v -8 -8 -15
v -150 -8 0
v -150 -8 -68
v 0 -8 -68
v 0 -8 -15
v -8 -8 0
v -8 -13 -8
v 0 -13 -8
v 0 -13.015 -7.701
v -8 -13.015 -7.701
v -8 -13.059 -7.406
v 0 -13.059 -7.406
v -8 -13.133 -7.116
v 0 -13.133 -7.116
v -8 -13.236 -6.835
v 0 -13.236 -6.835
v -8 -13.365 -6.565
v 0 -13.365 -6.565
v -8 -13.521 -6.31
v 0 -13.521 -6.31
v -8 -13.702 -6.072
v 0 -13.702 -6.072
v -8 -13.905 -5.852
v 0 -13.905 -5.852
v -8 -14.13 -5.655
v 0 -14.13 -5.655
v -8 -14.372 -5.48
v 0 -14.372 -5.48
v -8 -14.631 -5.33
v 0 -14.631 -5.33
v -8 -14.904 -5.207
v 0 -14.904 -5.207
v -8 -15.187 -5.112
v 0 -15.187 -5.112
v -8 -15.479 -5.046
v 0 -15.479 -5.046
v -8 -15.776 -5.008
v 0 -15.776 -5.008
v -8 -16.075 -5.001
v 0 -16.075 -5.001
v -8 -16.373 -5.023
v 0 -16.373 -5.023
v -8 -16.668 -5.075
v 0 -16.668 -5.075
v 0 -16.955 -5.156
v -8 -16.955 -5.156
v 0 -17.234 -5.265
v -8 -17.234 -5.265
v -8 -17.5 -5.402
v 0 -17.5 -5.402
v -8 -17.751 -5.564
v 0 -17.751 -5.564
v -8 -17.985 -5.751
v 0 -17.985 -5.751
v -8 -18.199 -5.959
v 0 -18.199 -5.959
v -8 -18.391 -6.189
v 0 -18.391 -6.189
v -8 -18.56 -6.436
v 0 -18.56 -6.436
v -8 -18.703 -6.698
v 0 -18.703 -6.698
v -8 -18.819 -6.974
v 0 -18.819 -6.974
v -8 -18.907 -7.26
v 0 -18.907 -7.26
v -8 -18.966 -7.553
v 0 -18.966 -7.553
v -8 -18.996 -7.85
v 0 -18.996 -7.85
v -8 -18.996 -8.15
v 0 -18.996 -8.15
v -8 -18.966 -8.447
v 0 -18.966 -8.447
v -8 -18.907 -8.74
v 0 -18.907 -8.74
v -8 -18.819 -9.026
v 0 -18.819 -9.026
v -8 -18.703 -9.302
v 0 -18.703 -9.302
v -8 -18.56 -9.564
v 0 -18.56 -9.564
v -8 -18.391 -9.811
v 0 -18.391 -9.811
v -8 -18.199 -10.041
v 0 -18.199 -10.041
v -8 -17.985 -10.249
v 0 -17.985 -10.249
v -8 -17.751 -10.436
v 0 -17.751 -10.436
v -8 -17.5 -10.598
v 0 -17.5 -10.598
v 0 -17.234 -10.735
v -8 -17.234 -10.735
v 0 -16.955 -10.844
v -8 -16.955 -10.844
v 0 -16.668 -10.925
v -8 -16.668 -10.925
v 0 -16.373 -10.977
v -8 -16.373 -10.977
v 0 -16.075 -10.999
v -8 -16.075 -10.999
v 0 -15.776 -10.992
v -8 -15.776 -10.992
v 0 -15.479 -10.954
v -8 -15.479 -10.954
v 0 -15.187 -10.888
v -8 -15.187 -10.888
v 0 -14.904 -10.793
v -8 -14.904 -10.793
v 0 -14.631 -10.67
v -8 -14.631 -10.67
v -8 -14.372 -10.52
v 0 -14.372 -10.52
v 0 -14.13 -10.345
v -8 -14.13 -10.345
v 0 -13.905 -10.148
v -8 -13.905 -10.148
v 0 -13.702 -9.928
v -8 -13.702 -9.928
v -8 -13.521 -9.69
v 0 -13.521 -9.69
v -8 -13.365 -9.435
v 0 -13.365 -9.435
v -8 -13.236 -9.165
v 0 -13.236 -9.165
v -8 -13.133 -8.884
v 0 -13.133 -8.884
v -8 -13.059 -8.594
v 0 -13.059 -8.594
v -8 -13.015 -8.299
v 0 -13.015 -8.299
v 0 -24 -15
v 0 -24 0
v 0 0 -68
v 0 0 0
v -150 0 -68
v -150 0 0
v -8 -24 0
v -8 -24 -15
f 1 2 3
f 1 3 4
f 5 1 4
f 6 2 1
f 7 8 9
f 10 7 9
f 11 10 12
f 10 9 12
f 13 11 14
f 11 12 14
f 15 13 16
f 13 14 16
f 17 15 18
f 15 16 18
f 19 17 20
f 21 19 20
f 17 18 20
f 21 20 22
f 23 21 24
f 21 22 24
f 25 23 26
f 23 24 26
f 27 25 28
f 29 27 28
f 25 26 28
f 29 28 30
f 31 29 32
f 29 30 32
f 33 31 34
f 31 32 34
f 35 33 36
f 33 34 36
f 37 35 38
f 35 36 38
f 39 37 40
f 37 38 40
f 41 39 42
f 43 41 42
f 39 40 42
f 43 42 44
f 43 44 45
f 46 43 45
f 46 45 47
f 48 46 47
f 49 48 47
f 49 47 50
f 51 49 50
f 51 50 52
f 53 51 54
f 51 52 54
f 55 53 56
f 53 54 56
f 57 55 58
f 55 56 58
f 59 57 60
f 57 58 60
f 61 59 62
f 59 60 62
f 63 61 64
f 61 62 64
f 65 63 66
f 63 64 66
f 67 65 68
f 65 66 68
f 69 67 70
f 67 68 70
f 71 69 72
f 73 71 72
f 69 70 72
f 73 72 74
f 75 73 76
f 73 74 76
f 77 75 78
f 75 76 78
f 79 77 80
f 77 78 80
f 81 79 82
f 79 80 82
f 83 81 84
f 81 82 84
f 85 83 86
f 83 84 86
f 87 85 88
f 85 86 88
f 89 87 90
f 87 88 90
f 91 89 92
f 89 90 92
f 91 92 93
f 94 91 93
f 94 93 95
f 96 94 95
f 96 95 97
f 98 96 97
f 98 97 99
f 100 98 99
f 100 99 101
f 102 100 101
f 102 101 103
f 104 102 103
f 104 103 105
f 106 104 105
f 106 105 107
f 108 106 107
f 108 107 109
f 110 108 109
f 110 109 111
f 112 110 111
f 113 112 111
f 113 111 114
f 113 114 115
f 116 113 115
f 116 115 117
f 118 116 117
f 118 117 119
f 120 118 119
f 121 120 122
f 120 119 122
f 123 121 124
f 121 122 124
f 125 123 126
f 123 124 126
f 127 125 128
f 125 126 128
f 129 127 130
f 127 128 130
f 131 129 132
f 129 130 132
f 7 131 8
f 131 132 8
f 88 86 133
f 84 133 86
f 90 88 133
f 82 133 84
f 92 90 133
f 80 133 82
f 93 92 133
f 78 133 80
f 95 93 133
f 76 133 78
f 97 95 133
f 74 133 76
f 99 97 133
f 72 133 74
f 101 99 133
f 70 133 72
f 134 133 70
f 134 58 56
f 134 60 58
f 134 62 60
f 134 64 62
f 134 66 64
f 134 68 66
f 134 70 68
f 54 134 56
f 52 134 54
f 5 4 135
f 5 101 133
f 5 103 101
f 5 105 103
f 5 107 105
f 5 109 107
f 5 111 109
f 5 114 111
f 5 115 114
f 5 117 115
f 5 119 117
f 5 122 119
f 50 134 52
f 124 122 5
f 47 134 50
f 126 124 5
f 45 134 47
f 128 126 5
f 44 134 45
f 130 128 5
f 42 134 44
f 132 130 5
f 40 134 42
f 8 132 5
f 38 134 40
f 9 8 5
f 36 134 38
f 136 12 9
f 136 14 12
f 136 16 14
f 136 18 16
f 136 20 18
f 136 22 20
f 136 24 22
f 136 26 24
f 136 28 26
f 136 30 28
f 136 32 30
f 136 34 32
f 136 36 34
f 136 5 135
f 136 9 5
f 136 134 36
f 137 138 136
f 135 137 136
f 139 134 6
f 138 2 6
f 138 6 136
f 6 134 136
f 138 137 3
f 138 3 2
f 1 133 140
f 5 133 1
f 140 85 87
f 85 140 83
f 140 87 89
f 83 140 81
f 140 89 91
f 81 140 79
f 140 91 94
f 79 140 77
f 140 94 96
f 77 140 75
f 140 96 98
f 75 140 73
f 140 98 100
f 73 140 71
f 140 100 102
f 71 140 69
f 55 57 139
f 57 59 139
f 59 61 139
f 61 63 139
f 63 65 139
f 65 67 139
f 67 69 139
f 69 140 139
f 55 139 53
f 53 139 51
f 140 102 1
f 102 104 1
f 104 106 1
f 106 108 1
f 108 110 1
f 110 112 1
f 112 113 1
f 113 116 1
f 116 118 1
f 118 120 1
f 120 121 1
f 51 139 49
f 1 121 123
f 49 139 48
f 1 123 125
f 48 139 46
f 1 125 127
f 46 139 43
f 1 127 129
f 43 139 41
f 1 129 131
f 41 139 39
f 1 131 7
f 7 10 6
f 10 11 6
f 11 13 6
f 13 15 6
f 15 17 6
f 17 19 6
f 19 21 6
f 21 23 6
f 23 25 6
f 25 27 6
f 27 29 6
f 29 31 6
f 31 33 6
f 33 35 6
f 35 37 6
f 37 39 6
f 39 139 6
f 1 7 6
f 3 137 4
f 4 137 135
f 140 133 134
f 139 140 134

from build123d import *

# Parameters (mm, degrees)
F0_W     = 150
F0_H     = 68
F1_DEPTH = 8
F2_W     = 24
F2_H     = 15
F2_R     = 3
F3_DEPTH = 8


with BuildPart() as f1:
    # F0 (on Front) → F1 (new body)
    with BuildSketch(Plane.XZ):
        with Locations((-75, -34)):
            Rectangle(F0_W, F0_H)
    extrude(amount=F1_DEPTH)

    # F2 (on face) → F3 (join)
    with BuildSketch(Plane.YZ):
        with Locations((-12, -7.5)):
            Rectangle(F2_W, F2_H)
        with Locations((-16, -8)):
            Circle(F2_R, mode=Mode.SUBTRACT)
    extrude(amount=-F3_DEPTH)


solid = f1.part
